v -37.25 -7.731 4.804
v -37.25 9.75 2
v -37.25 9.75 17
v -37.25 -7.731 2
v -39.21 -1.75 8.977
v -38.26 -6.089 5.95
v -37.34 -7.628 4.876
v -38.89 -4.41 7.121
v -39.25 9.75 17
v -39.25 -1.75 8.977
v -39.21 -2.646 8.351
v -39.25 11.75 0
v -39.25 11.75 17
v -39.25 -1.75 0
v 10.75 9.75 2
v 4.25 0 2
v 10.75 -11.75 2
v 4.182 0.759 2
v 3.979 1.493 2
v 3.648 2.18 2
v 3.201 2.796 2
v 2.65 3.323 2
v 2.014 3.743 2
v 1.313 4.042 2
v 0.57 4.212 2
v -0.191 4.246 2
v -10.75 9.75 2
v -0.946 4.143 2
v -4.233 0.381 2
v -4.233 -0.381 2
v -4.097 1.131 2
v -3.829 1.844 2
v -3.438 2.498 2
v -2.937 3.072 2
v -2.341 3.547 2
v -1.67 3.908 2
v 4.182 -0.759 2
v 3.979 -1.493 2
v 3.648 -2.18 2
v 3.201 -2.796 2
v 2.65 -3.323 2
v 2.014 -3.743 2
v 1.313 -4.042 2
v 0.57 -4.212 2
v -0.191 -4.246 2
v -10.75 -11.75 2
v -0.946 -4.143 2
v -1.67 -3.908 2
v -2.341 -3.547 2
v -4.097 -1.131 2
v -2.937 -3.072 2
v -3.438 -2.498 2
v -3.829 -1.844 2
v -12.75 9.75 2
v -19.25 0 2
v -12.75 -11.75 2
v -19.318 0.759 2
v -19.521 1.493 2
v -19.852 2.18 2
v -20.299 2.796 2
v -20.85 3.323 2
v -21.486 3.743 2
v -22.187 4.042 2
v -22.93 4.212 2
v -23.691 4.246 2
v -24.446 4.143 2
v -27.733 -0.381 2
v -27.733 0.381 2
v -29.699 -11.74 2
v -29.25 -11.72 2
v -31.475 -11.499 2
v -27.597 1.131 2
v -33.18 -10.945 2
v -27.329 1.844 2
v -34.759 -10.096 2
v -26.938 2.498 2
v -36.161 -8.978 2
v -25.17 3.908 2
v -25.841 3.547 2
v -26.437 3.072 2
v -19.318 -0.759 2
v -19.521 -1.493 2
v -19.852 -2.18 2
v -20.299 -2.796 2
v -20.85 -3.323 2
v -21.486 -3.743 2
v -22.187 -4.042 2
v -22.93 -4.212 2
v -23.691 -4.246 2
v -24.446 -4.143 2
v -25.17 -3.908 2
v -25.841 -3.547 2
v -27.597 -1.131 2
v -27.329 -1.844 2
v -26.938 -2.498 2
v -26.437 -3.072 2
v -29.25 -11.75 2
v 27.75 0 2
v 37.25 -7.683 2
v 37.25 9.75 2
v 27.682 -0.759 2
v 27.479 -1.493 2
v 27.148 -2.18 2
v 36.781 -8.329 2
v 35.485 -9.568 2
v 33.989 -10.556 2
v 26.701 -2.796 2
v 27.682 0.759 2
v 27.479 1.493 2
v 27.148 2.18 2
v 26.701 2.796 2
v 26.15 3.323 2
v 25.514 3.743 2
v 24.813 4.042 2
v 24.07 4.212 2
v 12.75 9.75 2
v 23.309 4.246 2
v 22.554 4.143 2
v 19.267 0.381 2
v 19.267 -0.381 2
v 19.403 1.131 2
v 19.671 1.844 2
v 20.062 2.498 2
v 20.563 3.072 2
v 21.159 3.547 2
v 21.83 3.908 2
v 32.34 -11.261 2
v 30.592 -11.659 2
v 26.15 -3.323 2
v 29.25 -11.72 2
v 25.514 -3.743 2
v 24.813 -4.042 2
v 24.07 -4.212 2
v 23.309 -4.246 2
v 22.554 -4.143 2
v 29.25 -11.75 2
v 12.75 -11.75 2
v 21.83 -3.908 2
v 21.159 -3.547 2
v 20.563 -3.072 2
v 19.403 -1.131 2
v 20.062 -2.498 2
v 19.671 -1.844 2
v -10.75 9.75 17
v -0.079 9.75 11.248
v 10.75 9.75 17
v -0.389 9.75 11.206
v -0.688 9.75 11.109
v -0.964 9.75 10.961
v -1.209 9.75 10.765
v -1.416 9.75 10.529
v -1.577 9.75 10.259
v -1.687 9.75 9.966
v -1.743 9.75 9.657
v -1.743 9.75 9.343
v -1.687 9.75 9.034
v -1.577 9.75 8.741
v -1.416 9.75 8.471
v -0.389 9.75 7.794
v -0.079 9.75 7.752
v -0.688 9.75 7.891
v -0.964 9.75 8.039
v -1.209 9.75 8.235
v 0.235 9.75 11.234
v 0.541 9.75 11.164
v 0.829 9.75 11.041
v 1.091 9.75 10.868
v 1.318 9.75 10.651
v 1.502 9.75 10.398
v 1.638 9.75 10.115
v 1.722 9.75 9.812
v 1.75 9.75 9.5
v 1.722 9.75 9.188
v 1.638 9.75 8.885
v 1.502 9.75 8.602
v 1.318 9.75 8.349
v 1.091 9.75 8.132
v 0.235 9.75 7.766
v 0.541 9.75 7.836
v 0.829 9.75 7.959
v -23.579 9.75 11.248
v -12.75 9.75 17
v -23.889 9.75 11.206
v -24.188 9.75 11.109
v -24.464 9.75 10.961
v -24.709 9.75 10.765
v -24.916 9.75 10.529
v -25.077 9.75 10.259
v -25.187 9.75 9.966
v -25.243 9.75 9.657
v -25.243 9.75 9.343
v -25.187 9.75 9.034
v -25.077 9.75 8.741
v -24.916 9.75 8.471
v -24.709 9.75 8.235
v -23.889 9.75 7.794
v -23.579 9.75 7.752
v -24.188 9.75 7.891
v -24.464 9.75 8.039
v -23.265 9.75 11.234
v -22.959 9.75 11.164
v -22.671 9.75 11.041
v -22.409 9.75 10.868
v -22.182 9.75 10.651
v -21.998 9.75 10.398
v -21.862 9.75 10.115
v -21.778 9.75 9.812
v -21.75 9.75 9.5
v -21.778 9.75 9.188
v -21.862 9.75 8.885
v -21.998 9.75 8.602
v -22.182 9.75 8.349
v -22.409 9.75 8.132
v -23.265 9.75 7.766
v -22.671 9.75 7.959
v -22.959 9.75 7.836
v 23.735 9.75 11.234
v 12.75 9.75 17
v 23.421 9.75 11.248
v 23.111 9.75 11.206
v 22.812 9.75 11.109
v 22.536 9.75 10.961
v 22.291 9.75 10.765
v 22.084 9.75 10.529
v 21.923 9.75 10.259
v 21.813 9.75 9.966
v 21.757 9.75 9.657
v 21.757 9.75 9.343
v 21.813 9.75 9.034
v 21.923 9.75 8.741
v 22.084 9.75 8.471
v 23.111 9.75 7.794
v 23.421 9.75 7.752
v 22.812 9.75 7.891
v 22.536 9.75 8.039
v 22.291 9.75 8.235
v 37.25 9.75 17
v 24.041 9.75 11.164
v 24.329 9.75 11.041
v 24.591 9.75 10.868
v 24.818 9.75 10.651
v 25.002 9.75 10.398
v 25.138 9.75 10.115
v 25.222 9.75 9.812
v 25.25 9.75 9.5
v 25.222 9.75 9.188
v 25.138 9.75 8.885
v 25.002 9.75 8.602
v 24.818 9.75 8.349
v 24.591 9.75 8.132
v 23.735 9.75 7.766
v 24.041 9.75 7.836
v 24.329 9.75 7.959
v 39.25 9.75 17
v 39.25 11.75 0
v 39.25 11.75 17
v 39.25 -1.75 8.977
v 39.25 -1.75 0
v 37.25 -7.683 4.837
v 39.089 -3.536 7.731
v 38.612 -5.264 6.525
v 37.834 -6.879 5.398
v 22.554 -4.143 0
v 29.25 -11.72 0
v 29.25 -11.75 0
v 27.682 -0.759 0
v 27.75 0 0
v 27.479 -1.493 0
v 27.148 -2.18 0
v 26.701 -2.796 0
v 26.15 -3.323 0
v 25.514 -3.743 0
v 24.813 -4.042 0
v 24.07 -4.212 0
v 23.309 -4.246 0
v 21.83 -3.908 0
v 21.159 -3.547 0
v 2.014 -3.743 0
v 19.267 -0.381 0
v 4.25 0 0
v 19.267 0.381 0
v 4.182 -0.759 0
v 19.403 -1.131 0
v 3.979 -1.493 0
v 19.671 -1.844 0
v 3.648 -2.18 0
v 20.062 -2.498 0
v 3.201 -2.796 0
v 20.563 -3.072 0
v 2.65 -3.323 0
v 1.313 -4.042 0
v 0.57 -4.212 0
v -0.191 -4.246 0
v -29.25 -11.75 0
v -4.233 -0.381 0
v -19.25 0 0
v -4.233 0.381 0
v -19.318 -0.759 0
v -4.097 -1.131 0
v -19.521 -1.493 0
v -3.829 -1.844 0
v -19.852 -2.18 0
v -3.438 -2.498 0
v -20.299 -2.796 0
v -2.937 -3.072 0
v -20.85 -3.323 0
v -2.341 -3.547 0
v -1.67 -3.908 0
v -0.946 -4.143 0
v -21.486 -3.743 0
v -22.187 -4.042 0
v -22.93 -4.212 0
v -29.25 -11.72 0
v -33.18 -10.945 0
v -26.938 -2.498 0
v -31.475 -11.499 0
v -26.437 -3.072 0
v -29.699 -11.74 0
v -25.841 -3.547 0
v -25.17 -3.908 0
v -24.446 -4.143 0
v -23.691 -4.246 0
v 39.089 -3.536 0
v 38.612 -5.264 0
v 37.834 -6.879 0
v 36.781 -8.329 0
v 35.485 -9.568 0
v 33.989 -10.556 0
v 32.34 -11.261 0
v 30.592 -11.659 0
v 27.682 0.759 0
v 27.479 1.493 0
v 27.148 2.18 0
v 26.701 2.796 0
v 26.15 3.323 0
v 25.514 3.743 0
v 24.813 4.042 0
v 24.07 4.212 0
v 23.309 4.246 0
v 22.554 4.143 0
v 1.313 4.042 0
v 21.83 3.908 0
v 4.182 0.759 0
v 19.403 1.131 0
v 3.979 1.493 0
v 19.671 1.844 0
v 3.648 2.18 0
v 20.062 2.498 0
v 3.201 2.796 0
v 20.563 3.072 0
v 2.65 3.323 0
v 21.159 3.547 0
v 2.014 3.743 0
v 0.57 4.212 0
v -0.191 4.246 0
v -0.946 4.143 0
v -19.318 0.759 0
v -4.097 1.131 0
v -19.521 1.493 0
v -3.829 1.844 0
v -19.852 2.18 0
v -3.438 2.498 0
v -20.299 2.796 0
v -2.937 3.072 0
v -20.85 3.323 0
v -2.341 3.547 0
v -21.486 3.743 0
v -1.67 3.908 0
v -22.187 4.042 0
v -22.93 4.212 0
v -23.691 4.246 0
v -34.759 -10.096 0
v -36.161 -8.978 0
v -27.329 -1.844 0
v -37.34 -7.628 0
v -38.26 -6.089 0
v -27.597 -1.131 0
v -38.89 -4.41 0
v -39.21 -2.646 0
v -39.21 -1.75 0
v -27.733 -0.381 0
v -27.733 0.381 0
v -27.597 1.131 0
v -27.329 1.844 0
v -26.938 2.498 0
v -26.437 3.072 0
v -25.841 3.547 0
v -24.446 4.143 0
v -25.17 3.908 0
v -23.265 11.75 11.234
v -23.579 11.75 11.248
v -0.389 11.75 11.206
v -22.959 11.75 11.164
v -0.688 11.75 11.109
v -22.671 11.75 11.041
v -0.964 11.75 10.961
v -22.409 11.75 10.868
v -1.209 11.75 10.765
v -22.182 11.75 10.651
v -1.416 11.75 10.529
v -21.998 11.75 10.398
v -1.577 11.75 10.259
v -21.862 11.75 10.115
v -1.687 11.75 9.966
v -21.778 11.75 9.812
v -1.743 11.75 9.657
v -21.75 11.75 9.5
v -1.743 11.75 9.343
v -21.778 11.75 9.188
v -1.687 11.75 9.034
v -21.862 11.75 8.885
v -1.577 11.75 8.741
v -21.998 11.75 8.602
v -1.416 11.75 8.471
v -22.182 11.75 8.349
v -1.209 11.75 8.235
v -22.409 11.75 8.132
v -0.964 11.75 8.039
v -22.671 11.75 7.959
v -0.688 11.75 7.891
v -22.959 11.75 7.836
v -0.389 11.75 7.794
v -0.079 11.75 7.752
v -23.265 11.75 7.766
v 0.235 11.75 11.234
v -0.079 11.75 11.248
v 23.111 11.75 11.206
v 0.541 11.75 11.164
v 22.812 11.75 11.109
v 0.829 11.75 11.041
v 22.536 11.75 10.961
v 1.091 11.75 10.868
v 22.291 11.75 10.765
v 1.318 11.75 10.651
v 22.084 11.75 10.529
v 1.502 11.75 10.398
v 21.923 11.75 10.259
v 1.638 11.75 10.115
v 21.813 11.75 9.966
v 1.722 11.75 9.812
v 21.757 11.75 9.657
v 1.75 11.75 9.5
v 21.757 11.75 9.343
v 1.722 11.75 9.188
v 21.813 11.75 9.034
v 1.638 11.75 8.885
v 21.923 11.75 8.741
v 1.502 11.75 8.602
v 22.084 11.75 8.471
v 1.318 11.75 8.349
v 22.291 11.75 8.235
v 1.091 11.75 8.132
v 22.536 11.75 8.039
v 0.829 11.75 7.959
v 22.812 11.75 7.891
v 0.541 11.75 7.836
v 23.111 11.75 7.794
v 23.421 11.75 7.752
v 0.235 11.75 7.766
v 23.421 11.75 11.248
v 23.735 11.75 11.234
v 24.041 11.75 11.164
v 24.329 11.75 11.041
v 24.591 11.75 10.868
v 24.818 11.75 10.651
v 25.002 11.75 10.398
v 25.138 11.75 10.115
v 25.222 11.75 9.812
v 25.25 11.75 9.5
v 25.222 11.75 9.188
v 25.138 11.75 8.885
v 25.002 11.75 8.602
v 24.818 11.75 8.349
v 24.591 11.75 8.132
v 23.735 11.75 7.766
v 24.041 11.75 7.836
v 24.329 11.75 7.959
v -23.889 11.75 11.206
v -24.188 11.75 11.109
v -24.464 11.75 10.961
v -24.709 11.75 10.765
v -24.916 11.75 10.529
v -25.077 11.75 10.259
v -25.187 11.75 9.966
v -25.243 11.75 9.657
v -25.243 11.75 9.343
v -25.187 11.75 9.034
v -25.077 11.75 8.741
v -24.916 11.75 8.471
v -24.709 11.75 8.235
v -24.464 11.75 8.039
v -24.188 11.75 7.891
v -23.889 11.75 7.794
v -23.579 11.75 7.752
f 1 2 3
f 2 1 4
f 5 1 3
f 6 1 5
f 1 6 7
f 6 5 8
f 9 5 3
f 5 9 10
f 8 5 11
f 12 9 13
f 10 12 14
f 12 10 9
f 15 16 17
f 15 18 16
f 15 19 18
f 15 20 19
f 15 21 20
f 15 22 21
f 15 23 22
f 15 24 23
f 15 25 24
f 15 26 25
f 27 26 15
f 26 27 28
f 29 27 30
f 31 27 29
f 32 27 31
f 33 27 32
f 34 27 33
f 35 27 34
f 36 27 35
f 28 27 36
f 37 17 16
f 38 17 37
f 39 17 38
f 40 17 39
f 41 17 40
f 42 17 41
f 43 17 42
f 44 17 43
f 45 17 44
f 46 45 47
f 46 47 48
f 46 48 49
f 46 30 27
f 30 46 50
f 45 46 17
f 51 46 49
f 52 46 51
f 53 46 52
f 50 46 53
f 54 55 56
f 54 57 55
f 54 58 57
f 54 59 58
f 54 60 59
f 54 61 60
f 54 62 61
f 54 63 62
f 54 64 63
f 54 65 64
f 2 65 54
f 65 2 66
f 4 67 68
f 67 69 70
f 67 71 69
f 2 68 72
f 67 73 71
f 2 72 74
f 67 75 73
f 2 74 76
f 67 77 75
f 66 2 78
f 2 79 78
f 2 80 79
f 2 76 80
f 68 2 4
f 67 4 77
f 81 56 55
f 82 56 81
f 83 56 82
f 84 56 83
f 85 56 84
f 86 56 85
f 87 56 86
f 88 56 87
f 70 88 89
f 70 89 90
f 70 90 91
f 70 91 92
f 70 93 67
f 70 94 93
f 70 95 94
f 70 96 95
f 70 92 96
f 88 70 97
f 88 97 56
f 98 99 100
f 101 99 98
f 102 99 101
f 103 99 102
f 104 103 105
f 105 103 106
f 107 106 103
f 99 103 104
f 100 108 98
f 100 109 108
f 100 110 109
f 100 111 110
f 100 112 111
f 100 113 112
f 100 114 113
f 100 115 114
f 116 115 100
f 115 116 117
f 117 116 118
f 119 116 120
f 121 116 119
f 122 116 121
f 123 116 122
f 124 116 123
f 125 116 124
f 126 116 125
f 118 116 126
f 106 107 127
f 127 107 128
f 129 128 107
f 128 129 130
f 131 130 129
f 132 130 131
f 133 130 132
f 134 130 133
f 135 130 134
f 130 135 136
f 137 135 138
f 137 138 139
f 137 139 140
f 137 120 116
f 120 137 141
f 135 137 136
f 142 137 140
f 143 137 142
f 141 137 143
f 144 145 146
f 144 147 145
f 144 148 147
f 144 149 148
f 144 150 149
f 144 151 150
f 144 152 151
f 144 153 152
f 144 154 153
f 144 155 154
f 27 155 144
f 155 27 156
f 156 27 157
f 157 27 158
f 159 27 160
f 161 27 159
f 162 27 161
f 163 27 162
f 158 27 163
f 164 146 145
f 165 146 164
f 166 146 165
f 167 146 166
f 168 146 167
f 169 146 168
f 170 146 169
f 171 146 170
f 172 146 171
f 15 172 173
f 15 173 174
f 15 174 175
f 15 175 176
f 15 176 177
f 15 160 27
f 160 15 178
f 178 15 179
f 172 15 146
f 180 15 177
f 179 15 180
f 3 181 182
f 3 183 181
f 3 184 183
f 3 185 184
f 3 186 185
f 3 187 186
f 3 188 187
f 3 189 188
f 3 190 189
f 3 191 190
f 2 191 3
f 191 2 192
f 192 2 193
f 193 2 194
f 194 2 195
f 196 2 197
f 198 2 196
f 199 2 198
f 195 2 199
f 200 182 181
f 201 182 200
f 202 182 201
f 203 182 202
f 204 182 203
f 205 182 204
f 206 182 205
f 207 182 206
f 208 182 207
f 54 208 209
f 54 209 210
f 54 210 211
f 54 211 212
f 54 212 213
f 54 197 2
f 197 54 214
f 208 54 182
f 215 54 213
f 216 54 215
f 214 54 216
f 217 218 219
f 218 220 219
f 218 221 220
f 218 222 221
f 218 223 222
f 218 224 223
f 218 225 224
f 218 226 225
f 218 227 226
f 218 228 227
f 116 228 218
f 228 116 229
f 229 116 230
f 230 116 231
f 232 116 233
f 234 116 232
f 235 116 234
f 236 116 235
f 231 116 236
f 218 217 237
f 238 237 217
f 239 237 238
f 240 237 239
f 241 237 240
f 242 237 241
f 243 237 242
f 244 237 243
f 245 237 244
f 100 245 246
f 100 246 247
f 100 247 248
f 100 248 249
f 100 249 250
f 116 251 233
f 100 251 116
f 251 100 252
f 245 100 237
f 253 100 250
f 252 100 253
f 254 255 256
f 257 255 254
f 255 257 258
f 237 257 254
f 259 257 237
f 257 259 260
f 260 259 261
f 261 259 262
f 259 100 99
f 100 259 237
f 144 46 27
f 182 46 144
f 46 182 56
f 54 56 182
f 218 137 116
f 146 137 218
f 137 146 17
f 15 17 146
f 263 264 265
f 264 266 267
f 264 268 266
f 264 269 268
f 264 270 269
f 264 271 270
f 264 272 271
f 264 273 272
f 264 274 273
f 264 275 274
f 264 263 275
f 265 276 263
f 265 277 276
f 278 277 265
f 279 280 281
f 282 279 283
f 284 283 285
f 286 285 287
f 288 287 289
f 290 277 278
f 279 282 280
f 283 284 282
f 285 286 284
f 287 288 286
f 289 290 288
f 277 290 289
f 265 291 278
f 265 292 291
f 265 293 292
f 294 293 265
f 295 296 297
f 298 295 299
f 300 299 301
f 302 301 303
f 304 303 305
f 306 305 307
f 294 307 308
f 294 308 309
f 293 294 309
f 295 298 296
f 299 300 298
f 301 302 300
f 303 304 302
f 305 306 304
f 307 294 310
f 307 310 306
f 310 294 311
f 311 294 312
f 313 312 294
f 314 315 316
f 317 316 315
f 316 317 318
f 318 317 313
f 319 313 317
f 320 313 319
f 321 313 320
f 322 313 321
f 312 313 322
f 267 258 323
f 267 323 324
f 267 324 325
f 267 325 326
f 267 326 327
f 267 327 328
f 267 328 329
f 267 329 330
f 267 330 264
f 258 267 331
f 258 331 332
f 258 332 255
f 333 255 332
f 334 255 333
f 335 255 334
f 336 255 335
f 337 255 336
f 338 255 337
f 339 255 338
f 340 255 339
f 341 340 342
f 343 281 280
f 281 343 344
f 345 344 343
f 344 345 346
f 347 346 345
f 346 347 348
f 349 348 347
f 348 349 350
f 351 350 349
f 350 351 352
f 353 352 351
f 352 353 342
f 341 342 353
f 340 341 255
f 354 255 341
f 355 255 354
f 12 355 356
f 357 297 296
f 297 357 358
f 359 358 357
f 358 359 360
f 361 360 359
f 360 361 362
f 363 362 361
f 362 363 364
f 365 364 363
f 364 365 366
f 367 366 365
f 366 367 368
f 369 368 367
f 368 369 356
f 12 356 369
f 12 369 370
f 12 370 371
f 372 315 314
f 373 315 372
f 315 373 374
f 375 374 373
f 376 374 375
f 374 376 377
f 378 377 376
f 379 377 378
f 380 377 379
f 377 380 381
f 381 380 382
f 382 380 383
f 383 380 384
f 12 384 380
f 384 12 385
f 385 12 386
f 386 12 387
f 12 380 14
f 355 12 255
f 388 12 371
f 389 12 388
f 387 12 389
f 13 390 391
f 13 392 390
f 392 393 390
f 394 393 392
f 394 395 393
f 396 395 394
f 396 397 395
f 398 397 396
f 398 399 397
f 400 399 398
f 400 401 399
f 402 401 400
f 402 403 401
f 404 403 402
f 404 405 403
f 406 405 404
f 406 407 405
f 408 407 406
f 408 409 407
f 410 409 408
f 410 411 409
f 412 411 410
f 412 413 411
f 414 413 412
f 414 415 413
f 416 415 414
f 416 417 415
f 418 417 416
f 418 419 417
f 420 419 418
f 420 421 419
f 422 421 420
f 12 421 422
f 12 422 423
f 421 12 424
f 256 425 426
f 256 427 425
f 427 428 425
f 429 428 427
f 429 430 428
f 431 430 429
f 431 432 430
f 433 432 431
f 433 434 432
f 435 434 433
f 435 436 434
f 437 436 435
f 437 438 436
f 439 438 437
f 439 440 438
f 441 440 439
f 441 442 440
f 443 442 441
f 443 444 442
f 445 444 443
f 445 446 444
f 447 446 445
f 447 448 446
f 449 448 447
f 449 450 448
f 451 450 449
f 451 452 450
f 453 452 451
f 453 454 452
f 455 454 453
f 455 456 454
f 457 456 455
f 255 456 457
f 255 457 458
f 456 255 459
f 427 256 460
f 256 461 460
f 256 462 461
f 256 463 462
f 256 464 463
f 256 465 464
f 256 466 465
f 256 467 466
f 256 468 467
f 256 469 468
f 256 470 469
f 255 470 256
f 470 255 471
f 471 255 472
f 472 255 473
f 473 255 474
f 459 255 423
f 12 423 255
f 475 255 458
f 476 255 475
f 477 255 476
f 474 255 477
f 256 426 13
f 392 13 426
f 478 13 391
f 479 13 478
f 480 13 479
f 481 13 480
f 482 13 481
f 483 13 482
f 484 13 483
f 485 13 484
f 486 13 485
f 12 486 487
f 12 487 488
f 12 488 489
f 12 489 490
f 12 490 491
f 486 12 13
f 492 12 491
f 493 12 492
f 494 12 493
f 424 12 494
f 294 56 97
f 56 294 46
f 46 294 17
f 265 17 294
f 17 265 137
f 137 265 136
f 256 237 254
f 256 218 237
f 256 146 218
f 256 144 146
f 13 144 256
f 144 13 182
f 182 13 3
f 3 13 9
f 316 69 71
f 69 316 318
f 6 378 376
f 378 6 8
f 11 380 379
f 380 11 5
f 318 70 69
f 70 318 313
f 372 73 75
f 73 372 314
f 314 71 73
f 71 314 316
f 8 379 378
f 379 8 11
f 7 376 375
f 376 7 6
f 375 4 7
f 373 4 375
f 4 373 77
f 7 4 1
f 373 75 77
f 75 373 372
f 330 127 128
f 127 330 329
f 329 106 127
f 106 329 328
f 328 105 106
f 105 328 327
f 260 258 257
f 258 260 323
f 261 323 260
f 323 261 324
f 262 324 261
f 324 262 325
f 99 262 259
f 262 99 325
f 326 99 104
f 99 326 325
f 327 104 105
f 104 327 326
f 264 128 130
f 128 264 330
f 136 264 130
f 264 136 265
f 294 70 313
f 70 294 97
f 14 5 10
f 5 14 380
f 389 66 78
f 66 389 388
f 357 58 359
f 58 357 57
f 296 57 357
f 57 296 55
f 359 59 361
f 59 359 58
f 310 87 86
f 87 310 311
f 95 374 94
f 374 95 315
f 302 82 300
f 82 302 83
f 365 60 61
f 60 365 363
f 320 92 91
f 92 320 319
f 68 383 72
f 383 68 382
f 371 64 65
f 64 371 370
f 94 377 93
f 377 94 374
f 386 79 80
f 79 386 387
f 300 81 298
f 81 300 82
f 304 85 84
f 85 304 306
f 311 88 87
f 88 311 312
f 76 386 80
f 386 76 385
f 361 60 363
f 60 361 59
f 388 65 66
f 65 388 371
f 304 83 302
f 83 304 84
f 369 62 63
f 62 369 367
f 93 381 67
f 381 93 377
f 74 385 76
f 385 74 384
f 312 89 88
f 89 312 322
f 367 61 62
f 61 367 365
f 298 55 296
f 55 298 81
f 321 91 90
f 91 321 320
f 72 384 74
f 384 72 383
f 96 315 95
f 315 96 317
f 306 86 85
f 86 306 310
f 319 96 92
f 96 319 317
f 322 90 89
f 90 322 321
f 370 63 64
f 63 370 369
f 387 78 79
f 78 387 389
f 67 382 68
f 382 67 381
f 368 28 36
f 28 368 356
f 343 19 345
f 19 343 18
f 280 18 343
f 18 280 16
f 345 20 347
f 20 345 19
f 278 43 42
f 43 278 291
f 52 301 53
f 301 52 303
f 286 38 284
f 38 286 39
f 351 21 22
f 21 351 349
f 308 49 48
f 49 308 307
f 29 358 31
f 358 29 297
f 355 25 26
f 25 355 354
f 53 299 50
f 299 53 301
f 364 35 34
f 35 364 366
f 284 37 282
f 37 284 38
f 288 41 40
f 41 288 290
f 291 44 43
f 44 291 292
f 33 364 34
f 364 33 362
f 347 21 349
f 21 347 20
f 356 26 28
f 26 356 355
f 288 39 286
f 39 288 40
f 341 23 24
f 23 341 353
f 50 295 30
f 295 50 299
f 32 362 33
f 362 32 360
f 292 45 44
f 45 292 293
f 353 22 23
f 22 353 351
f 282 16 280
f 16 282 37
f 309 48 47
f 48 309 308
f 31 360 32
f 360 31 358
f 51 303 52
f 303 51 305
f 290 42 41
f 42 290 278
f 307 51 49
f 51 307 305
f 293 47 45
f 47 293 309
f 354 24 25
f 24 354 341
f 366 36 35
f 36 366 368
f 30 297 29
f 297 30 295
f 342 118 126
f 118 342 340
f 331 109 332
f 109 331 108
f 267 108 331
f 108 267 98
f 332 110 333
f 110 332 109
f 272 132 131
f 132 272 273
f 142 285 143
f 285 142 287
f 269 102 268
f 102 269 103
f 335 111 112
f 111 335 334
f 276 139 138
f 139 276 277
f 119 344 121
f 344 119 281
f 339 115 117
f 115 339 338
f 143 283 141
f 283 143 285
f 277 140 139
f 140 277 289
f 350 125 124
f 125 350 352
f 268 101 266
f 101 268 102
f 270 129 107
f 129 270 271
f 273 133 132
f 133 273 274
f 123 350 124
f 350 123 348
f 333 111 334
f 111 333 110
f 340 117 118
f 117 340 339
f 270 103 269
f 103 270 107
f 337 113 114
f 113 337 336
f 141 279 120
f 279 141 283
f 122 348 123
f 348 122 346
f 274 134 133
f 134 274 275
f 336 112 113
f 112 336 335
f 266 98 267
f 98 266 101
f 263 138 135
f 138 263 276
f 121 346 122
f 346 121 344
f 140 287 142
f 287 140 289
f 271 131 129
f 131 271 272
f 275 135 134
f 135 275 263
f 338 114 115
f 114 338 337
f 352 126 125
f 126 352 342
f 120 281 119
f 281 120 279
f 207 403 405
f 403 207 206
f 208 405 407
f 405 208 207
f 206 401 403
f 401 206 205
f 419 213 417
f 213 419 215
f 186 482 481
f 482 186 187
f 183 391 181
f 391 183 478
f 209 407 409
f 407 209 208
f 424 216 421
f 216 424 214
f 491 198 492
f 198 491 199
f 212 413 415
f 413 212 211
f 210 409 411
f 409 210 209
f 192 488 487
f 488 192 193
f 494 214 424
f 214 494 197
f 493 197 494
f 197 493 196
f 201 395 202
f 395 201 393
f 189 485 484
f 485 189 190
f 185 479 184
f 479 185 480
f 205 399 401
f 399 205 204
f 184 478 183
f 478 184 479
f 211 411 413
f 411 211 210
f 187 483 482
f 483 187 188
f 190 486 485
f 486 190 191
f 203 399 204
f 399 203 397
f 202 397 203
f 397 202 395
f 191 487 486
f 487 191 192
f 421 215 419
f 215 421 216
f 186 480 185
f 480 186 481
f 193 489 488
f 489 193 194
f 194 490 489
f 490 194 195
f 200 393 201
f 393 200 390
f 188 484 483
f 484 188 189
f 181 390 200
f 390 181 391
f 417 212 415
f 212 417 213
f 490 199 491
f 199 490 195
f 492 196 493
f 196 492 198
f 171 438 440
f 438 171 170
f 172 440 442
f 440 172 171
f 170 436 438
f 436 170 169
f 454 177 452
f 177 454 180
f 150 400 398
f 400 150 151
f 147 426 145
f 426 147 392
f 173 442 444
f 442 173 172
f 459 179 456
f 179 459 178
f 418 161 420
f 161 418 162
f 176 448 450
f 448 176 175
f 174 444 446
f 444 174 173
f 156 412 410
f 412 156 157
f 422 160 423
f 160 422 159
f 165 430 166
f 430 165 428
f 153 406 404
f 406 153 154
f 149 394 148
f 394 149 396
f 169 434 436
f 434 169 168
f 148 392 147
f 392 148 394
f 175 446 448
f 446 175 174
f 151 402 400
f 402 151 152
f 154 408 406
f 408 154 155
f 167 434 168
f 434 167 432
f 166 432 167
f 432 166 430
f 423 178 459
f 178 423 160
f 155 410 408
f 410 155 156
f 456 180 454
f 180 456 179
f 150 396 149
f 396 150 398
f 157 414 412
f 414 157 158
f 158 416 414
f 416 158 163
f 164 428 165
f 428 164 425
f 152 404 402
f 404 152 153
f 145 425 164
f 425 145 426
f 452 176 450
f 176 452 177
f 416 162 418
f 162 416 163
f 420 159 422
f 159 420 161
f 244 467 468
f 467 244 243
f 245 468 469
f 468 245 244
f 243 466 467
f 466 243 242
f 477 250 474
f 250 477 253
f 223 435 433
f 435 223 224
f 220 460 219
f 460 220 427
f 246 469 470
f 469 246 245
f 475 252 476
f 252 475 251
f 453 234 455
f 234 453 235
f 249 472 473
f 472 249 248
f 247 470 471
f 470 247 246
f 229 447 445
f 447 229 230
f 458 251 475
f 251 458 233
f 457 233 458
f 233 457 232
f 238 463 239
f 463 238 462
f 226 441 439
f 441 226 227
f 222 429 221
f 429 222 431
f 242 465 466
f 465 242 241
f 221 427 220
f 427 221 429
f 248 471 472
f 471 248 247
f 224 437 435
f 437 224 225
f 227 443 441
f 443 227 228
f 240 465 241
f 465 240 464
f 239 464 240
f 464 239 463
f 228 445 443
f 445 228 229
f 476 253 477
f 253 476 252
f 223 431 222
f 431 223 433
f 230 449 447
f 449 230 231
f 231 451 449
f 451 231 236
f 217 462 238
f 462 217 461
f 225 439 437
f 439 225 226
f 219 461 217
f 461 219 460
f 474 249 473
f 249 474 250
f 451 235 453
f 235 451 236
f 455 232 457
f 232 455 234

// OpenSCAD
/*
 * Plug Panel (Parametric), v0.42
 *
 * by Alex Franke (CodeCreations), Jan 2013
 * http://www.theFrankes.com
 * 
 * Licenced under Creative Commons Attribution - Non-Commercial - Share Alike 3.0 
 * 
 * DESCRIPTION: This is a parametric plug panel, allowing you to attach a set of 
 *   panel-mounted plugs. It includes some ribs for added strength, and it's fully 
 *   "inside-out" parametric, with the overall size driven by the sizes and distances 
 *   you choose for the details. It prints out the total dimensions. 
 * 
 * INSTRUCTIONS: Choose some values in the "User-defined values" section, render,
 *   and print. You may need to run the output through netfabb. 
 * 
 * v0.42, Jan 18, 2013: Initial Release.
 * 
 * TODO: 
 *   * None at this time
 */

/////////////////////////////////////////////////////////////////////////////
// User-defined values... 
/////////////////////////////////////////////////////////////////////////////

// The diameter of the holes for the plugs
holeDiameter = 8.5;

// Number of rows of holes in the panel 
rows = 1;

// Number of columns of holes in the panel 
columns = 3;

// How far apart the holes are from each other
separation = 15;

// The thickness of the panel, mouting bracket and ribs
thickness = 2;

// Extra width added to each side
xMargin = 4;

// Extra height added to the top and bottom
yMargin = 0;

// Rounding radius at the corners opposide the bracket
roundRadius = 10;

// The depth of the mounting bracket
mountingDepth = 15;

// The diameter of the mounting holes
mountHoleDiameter = 3.5;

// Overall curve quality
$fn = 35;


/////////////////////////////////////////////////////////////////////////////
// Some calculated values and helpful output... 
/////////////////////////////////////////////////////////////////////////////
X = 0 + 0;  // ignore in customizer
Y = 1 + 0;  // ignore in customizer
Z = 2 + 0;  // ignore in customizer
margin = [xMargin,yMargin]; 

totalSize = [
	(holeDiameter+separation)*columns+margin[X]*2, 
	(holeDiameter+separation)*rows+margin[Y]*2,
	mountingDepth+thickness
	];
holeDist = holeDiameter+separation; 

echo( str( "Total size is ", totalSize ) ); 

/////////////////////////////////////////////////////////////////////////////
// The code...
/////////////////////////////////////////////////////////////////////////////
difference() {

	intersection() {
		union() {
			// face plate
			translate([0,0,thickness/2]) 
				cube([totalSize[X], totalSize[Y], thickness], center=true);
	
			// mounting plate
			translate([0,totalSize[Y]/2-thickness/2,mountingDepth/2+thickness]) 
				cube([totalSize[X], thickness, mountingDepth], center=true);
	
			// outer supports 
			for(i=[-1,1]) 
				translate([i*(totalSize[X]-thickness)/2,totalSize[Y]/2-thickness,thickness]) 
					support();
	
			// inner supports 
			translate([-(holeDist*(columns-2)/2),0,0])
				for(x=[0:columns-2]) 
					translate([holeDist*x,totalSize[Y]/2-thickness,thickness]) 
						support();
		}

		// Rounded edges 
		translate([0,0,totalSize[Z]/2]) 
		union() {
			translate([0,roundRadius/2,0]) 
				cube([totalSize[X], totalSize[Y]-roundRadius, totalSize[Z]], center=true);
			translate([0,-totalSize[Y]/2--roundRadius,0]) {
				cube([totalSize[X]-roundRadius*2, roundRadius*2, totalSize[Z]], center=true);
				for(x=[-1,1]) {
					translate([(totalSize[0]/2-roundRadius)*x,0,0]) 
						cylinder(h=totalSize[Z], r=roundRadius, center=true); 
				}
			}
		}	
	}


	// front panel holes 
	translate([-(holeDist*(columns-1))/2,-(holeDist*(rows-1))/2,0]) 
		for(x=[0:columns-1], y=[0:rows-1]) {
			translate([x*(holeDiameter+separation), y*(holeDiameter+separation),thickness/2]) 
				cylinder(h=thickness+1, r=holeDiameter/2, center=true);
	}

	// Mounting holes 
	translate([-(holeDist*(columns-1))/2,totalSize[Y]/2,thickness+mountingDepth/2]) 
		rotate([90,0,0]) 
		for(x=[0:columns-1]) {
			translate([x*(holeDiameter+separation), 0, thickness/2]) 
				cylinder(h=thickness+1, r=mountHoleDiameter/2, center=true);
	}

}


/////////////////////////////////////////////////////////////////////////////
// The modules...
/////////////////////////////////////////////////////////////////////////////

module support() {
	rotate([90,0,-90]) 
		linear_extrude(height=thickness, center=true) 
			polygon(points=[[0,0],[0,mountingDepth],[totalSize[Y]-thickness,0]]);
}
